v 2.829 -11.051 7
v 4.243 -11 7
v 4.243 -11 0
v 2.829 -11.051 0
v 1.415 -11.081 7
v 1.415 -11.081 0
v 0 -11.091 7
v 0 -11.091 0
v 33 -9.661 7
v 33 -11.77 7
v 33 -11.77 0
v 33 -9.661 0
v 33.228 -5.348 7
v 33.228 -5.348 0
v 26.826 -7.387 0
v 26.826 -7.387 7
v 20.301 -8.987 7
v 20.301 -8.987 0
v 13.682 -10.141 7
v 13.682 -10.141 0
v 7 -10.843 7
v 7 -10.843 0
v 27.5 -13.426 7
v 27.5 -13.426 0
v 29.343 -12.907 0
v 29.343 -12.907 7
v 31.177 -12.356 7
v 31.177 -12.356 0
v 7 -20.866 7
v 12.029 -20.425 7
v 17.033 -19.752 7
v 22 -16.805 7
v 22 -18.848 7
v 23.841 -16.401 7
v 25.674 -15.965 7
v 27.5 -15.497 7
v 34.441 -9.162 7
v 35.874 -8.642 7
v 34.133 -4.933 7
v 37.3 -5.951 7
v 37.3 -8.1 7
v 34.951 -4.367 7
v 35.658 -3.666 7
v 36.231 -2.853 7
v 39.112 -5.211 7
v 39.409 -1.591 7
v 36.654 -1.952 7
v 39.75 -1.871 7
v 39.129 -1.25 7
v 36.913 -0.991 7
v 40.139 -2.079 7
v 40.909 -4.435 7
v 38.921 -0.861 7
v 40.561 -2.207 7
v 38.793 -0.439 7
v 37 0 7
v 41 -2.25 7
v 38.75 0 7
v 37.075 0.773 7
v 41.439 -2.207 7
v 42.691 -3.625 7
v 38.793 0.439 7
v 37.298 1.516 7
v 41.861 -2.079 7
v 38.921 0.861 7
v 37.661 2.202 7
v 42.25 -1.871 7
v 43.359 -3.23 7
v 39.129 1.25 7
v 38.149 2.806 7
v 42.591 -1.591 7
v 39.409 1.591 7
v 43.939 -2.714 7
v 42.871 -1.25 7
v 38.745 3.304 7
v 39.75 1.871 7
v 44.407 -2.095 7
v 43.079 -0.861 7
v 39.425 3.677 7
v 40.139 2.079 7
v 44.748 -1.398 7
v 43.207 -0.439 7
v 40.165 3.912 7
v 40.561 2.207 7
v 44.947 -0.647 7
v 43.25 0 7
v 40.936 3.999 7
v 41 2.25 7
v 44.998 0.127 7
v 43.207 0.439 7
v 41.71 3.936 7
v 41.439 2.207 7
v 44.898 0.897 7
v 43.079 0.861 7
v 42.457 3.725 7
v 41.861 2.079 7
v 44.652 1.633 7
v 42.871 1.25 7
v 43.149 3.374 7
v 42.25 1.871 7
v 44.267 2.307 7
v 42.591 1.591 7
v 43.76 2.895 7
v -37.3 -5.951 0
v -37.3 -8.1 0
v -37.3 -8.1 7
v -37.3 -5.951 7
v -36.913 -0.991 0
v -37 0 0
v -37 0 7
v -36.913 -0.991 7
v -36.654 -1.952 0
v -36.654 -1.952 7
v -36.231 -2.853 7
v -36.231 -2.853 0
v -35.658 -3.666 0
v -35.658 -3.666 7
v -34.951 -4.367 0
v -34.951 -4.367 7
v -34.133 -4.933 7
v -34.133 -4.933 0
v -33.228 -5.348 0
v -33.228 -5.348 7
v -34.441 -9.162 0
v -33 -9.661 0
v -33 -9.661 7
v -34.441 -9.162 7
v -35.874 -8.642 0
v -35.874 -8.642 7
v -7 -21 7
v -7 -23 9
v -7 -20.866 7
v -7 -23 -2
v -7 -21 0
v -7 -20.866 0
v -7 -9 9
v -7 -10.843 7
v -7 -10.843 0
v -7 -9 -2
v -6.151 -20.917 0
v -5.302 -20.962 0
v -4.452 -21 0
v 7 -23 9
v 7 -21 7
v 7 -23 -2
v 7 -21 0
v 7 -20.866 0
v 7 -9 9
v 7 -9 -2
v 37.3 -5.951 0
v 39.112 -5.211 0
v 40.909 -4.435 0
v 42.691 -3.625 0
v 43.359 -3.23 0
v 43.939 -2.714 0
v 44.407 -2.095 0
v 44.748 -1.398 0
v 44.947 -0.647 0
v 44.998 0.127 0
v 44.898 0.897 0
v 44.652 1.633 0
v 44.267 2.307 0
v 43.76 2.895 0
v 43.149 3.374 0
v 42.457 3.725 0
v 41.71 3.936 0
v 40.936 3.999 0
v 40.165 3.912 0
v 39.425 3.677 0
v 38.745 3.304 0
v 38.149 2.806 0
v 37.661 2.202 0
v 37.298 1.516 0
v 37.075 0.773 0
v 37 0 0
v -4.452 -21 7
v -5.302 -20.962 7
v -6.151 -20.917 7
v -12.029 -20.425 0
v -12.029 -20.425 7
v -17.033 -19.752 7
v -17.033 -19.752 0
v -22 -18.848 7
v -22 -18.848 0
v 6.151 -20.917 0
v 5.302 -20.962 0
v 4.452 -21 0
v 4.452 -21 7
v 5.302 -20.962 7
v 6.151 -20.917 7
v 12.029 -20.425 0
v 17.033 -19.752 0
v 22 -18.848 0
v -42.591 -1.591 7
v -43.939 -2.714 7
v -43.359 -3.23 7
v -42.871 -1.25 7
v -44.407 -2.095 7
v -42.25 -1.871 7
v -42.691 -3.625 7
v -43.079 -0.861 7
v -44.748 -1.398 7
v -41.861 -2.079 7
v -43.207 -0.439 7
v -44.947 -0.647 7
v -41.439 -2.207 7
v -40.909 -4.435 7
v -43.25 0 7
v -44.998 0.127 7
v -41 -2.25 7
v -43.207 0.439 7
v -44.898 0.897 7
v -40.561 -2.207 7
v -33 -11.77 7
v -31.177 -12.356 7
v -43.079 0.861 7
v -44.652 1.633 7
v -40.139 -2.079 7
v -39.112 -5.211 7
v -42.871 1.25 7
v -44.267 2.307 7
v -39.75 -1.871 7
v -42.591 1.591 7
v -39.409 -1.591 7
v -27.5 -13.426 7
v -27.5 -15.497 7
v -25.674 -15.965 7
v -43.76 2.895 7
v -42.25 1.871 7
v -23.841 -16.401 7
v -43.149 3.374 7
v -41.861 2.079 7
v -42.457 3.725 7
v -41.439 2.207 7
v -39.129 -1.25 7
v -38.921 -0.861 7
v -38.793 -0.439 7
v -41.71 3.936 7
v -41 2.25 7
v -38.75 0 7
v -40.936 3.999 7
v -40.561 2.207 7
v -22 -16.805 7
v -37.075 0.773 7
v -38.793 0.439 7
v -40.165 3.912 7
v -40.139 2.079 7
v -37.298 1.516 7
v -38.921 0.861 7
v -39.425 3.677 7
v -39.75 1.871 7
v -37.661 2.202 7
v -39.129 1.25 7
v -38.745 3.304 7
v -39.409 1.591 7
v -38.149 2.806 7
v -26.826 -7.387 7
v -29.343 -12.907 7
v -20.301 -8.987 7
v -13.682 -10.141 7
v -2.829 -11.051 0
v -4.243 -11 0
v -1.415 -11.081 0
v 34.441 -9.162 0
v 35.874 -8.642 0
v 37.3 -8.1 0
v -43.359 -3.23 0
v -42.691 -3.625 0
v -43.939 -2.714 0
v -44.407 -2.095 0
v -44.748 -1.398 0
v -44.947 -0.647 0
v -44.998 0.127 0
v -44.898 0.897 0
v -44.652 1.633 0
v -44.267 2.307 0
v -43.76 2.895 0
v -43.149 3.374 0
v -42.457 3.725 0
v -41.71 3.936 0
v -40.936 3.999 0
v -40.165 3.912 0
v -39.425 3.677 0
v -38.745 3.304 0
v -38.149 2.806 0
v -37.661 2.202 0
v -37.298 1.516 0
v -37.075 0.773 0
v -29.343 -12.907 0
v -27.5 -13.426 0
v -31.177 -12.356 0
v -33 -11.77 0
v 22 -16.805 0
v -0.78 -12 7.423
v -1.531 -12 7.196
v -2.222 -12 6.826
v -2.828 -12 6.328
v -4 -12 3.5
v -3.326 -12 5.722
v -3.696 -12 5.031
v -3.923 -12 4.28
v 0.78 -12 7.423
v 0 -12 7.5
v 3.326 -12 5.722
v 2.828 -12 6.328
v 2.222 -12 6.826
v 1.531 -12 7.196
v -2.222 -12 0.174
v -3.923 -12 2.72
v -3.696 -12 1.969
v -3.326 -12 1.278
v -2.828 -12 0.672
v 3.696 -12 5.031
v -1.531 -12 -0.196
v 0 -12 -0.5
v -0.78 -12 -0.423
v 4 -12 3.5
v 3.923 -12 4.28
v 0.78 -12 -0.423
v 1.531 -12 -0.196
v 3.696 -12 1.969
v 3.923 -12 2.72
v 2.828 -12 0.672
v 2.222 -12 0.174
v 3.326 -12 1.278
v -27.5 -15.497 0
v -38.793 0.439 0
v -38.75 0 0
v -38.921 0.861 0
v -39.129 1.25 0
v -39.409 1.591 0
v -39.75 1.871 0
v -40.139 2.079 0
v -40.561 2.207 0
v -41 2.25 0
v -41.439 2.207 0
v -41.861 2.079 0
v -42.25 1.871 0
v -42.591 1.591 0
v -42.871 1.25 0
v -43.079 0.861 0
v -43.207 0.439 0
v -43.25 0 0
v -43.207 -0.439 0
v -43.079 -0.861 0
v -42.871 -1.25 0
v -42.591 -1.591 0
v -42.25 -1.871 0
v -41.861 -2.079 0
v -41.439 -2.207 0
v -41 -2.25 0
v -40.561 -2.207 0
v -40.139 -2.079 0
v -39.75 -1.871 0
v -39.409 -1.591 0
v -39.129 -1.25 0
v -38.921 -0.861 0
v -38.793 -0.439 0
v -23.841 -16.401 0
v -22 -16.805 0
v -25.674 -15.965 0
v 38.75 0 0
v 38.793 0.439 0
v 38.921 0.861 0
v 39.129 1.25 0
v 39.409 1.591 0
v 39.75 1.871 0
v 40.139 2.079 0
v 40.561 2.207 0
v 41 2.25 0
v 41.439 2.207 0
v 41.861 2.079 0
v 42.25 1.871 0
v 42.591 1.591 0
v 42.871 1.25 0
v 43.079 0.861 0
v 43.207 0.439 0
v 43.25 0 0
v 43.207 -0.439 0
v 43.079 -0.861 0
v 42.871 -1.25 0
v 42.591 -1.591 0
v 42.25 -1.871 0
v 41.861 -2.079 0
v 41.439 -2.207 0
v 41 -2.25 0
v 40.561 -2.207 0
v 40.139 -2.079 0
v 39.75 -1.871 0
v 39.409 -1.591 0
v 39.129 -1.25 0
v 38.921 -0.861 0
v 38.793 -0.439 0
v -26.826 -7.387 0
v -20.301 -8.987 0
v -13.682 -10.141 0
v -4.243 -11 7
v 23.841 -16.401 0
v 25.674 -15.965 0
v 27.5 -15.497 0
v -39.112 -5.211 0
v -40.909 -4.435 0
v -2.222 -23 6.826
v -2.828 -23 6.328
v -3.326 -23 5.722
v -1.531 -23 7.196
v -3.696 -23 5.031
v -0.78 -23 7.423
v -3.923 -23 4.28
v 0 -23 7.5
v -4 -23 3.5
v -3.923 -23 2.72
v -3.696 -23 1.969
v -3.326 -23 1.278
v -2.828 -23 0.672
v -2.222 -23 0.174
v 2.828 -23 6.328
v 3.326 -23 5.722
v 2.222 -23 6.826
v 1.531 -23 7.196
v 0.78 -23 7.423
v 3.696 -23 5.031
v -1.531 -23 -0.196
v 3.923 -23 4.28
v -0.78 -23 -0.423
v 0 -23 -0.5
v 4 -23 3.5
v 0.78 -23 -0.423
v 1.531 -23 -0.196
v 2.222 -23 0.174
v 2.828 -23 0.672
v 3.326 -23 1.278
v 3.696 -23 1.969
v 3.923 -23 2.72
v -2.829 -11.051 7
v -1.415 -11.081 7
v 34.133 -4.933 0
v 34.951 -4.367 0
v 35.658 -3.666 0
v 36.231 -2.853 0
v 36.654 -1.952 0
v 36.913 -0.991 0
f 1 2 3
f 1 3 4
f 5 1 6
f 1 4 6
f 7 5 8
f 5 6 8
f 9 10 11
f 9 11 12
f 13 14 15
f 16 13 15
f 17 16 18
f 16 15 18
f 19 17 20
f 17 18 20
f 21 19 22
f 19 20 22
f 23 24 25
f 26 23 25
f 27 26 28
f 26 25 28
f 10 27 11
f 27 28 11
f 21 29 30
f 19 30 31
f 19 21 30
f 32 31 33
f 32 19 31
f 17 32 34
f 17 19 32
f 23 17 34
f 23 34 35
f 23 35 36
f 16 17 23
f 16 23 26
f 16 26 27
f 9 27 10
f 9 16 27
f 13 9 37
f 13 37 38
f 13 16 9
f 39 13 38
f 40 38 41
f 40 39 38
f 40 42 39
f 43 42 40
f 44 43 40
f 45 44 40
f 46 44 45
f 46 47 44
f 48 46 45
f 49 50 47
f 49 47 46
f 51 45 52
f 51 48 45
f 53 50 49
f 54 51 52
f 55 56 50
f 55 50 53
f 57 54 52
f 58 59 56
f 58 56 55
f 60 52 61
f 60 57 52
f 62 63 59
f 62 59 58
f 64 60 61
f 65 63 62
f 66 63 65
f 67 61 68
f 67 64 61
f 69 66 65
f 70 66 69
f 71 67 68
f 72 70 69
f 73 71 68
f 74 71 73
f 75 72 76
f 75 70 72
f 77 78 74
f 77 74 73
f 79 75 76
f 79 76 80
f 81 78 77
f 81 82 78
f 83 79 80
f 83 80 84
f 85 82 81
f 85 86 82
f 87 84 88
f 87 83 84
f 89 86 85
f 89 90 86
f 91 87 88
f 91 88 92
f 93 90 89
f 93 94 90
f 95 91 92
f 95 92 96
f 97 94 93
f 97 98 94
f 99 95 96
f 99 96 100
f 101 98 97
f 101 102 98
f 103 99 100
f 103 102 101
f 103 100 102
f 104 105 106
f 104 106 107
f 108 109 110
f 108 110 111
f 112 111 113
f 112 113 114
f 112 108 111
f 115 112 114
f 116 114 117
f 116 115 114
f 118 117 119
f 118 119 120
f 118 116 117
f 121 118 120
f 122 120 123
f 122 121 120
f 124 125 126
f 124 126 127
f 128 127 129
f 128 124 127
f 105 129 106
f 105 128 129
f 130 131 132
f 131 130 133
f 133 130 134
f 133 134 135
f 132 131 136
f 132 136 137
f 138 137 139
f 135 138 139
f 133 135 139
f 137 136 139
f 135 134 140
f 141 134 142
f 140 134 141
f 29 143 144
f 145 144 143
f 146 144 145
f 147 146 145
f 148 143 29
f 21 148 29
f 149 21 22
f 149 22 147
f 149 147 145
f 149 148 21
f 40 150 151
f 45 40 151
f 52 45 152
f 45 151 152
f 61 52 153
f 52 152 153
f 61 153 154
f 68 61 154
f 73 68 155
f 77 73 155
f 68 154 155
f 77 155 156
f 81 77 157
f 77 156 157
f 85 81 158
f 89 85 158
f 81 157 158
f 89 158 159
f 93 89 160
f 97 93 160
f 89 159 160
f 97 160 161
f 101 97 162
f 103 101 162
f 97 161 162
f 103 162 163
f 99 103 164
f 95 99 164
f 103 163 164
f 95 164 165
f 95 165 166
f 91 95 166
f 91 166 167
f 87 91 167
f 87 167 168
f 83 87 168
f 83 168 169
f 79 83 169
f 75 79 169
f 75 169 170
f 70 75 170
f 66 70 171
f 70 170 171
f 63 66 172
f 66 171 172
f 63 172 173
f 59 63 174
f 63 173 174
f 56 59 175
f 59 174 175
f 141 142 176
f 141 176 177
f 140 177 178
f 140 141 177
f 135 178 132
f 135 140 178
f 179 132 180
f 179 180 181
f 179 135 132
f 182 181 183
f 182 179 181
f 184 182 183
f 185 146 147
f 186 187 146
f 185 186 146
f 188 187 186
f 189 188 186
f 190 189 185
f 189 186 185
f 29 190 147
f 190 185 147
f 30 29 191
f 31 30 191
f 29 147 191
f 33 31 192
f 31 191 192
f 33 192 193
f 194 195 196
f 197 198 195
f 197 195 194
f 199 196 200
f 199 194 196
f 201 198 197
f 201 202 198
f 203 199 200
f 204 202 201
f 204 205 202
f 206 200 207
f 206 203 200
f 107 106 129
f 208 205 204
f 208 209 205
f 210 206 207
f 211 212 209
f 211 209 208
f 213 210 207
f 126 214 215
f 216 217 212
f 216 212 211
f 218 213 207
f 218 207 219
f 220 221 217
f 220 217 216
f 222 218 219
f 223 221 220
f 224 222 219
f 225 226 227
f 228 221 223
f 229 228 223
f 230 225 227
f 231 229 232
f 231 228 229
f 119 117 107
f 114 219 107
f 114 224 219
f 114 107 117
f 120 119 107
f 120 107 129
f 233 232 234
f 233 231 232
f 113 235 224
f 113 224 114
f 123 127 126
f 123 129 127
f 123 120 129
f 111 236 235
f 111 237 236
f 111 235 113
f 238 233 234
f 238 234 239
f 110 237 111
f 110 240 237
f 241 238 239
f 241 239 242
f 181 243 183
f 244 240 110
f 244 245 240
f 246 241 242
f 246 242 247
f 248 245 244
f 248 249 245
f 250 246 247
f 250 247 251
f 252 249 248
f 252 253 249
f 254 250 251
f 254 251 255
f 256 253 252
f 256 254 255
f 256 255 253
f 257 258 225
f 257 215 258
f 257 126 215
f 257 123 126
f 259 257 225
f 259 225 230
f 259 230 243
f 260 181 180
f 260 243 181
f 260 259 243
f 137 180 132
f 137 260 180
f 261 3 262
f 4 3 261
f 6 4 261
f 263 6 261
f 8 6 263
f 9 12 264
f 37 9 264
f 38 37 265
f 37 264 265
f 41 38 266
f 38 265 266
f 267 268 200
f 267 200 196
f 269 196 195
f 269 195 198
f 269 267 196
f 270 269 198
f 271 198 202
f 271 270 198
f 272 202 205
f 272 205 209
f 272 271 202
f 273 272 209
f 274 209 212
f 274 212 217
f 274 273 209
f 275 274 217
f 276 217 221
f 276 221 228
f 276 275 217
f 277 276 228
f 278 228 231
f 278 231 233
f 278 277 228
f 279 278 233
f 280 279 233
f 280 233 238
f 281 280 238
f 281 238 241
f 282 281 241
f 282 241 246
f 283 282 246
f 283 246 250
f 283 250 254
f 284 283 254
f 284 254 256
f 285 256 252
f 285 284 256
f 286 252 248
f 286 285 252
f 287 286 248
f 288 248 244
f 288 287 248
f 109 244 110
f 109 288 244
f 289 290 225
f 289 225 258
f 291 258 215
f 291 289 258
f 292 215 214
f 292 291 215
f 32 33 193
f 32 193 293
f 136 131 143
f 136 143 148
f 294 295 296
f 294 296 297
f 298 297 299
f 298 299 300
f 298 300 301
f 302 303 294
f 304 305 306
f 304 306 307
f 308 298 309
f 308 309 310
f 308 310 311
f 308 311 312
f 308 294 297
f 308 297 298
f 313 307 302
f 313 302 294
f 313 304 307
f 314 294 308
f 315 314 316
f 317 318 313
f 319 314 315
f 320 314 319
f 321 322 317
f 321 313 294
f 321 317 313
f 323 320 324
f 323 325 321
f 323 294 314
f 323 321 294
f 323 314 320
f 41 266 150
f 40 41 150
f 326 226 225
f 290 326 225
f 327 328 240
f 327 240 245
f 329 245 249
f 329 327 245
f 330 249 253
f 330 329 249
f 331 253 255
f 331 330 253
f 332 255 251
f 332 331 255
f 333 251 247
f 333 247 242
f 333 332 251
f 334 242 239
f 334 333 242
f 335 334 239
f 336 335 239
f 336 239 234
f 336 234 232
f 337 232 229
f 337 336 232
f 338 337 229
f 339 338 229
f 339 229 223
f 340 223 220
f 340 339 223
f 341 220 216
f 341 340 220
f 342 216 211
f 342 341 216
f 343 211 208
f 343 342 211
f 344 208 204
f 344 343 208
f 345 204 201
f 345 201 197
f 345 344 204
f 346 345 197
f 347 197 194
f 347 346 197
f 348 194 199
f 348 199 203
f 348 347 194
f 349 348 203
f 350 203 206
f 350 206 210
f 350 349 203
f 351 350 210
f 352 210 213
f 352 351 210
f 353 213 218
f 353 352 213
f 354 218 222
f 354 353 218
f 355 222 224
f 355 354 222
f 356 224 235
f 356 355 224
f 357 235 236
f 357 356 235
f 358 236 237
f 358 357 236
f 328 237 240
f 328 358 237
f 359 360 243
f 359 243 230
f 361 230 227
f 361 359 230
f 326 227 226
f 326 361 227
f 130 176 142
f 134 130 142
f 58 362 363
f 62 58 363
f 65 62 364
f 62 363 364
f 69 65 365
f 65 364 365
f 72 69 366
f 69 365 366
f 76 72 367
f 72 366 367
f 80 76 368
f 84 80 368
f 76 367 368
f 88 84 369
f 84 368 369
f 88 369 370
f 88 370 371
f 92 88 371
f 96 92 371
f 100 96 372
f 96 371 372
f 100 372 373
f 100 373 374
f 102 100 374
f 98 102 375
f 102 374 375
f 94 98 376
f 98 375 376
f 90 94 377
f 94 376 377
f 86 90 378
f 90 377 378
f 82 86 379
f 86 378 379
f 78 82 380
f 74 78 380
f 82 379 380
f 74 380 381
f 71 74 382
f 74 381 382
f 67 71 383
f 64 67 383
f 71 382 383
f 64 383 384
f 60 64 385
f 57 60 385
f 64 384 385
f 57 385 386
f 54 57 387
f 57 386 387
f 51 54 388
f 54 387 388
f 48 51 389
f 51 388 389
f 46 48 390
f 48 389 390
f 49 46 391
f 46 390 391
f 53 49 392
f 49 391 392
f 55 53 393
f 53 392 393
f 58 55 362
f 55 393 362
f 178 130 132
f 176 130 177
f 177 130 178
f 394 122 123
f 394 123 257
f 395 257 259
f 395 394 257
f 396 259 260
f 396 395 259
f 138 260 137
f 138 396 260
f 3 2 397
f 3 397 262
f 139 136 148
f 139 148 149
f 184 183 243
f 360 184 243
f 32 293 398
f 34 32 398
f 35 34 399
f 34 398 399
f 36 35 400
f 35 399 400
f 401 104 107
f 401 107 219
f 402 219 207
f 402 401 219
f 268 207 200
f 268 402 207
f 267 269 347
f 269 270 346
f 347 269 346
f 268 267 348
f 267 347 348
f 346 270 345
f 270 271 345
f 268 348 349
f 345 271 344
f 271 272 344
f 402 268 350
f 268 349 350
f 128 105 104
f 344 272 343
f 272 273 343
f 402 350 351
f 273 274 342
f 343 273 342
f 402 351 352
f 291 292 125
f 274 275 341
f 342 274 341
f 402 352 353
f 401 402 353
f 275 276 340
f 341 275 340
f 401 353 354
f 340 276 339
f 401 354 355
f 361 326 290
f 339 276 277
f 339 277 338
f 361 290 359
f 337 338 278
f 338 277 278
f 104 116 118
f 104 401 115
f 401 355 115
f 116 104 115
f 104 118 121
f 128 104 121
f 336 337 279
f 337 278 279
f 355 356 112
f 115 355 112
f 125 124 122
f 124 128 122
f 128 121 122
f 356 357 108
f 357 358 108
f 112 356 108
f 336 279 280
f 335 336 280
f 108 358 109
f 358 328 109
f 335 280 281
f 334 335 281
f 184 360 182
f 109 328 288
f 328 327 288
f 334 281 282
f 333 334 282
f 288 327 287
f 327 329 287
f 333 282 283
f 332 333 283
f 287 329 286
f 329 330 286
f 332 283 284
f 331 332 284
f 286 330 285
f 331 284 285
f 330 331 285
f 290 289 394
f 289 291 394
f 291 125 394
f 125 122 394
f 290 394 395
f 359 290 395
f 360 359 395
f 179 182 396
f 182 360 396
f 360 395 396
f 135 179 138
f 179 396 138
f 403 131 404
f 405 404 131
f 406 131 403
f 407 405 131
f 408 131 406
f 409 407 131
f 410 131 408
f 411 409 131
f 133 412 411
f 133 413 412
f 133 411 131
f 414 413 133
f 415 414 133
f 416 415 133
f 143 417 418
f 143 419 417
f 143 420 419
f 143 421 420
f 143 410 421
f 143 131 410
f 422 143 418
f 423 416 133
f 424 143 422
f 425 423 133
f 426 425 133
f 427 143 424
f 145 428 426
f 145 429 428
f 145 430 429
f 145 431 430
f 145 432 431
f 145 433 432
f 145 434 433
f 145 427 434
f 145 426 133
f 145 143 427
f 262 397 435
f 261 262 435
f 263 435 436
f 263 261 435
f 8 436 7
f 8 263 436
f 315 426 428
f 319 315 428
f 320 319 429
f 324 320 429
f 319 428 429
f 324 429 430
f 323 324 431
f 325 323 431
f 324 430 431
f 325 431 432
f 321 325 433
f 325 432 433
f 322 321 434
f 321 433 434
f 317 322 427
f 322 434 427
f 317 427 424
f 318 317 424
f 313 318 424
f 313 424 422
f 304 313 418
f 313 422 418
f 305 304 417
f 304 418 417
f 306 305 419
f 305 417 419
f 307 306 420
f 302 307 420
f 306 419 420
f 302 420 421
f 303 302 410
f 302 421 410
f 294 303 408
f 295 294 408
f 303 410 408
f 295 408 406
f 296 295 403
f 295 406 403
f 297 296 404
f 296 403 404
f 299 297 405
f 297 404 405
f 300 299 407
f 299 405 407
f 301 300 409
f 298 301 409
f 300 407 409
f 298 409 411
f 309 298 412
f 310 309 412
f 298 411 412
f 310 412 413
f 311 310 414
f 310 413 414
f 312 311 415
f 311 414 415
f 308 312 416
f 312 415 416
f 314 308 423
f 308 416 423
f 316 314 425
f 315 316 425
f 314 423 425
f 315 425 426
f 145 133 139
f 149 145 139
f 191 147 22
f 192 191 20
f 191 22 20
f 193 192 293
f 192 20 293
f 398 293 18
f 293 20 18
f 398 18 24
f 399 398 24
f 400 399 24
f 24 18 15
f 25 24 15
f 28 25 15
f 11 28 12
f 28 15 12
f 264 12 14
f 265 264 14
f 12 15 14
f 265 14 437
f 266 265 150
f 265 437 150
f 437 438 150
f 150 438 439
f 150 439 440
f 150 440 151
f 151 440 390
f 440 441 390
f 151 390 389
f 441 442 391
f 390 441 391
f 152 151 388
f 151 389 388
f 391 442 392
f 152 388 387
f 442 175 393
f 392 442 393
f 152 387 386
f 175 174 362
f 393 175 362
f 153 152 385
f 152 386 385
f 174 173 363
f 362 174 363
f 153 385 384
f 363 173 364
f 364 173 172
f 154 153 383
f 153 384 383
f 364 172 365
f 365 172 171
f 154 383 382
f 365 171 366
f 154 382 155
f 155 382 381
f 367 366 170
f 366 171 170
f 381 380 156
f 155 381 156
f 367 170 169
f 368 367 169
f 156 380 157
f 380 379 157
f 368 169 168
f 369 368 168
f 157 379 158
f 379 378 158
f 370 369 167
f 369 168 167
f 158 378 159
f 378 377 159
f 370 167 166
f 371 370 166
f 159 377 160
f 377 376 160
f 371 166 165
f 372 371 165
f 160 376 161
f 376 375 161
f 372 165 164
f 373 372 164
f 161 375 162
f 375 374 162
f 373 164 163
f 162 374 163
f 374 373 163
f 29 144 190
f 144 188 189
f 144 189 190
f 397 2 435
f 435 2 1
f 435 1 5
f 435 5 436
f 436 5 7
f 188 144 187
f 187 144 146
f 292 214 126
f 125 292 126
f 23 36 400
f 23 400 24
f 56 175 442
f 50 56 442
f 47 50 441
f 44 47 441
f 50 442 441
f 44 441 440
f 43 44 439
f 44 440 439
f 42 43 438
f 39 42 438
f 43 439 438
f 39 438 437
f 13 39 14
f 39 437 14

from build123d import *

# Parameters (mm, degrees)
SKETCH1_R           = 2.25
BOSS_EXTRUDE2_DEPTH = 7
SKETCH4_W           = 11
SKETCH4_H           = 14
SKETCH4_W_2         = 7
SKETCH4_H_2         = 10
BOSS_EXTRUDE3_DEPTH = 7
SKETCH5_R           = 4
CUT_EXTRUDE1_DEPTH  = 11


with BuildPart() as part:
    # Sketch1 → Boss-Extrude2 (new body)
    with BuildSketch(Plane.XY):
        with BuildLine():
            Line((0, -11.090956097), (0, -13.090956097))
            Line((0, -13.090956097), (0, -15.090956097))
            Line((0, -15.090956097), (0, -17.090956097))
            Line((0, -17.090956097), (0, -19.090956097))
            Line((0, -19.090956097), (0, -21.090956097))
            ThreePointArc((0, -21.090956097), (-11.05703676, -20.528689096), (-22, -18.847688905))
            Line((-22, -18.847688905), (-22, -16.804852023))
            ThreePointArc((-22, -16.804852023), (-24.758641092, -16.187112084), (-27.5, -15.496710289))
            Line((-27.5, -15.496710289), (-27.5, -13.425797094))
            ThreePointArc((-27.5, -13.425797094), (-30.261321018, -12.635734431), (-33, -11.770442452))
            Line((-33, -11.770442452), (-33, -9.661443438))
            ThreePointArc((-33, -9.661443438), (-35.158670825, -8.904528832), (-37.3, -8.099861934))
            Line((-37.3, -8.099861934), (-37.3, -5.951011498))
            ThreePointArc((-37.3, -5.951011498), (-40.012264818, -4.827241682), (-42.690721649, -3.625115213))
            ThreePointArc((-42.690721649, -3.625115213), (-43.149082758, 3.373639474), (-37, 0))
            ThreePointArc((-37, 0), (-35.962178278, -3.272189532), (-33.228136882, -5.348078717))
            ThreePointArc((-33.228136882, -5.348078717), (-16.860380491, -9.644672426), (0, -11.090956097))
        make_face()
        with Locations((-41, 0)):
            Circle(SKETCH1_R, mode=Mode.SUBTRACT)
    extrude(amount=BOSS_EXTRUDE2_DEPTH)

    # Mirror1: part across plane


with BuildPart() as part_1:
    add(part.part)
    add(part.part.mirror(Plane(origin=(0, -11.090956097, 7), x_dir=(0, 0, 1), z_dir=(1, 0, 0))))

    # Sketch4 → Boss-Extrude3 (add, symmetric)
    with BuildSketch(Plane(origin=(0, 0, 0), x_dir=(0, 0, -1), z_dir=(1, 0, 0))):
        with Locations((-3.5, -16)):
            Rectangle(SKETCH4_W, SKETCH4_H)
        with Locations((-3.5, -16)):
            Rectangle(SKETCH4_W_2, SKETCH4_H_2, mode=Mode.SUBTRACT)
    extrude(amount=BOSS_EXTRUDE3_DEPTH, both=True)

    # Sketch5 → Cut-Extrude1 (cut)
    with BuildSketch(Plane.XZ.offset(23)):
        with Locations(Location((0, 3.5, 0), (0, 0, 270))):
            Circle(SKETCH5_R)
    extrude(amount=-CUT_EXTRUDE1_DEPTH, mode=Mode.SUBTRACT)


solid = part_1.part
